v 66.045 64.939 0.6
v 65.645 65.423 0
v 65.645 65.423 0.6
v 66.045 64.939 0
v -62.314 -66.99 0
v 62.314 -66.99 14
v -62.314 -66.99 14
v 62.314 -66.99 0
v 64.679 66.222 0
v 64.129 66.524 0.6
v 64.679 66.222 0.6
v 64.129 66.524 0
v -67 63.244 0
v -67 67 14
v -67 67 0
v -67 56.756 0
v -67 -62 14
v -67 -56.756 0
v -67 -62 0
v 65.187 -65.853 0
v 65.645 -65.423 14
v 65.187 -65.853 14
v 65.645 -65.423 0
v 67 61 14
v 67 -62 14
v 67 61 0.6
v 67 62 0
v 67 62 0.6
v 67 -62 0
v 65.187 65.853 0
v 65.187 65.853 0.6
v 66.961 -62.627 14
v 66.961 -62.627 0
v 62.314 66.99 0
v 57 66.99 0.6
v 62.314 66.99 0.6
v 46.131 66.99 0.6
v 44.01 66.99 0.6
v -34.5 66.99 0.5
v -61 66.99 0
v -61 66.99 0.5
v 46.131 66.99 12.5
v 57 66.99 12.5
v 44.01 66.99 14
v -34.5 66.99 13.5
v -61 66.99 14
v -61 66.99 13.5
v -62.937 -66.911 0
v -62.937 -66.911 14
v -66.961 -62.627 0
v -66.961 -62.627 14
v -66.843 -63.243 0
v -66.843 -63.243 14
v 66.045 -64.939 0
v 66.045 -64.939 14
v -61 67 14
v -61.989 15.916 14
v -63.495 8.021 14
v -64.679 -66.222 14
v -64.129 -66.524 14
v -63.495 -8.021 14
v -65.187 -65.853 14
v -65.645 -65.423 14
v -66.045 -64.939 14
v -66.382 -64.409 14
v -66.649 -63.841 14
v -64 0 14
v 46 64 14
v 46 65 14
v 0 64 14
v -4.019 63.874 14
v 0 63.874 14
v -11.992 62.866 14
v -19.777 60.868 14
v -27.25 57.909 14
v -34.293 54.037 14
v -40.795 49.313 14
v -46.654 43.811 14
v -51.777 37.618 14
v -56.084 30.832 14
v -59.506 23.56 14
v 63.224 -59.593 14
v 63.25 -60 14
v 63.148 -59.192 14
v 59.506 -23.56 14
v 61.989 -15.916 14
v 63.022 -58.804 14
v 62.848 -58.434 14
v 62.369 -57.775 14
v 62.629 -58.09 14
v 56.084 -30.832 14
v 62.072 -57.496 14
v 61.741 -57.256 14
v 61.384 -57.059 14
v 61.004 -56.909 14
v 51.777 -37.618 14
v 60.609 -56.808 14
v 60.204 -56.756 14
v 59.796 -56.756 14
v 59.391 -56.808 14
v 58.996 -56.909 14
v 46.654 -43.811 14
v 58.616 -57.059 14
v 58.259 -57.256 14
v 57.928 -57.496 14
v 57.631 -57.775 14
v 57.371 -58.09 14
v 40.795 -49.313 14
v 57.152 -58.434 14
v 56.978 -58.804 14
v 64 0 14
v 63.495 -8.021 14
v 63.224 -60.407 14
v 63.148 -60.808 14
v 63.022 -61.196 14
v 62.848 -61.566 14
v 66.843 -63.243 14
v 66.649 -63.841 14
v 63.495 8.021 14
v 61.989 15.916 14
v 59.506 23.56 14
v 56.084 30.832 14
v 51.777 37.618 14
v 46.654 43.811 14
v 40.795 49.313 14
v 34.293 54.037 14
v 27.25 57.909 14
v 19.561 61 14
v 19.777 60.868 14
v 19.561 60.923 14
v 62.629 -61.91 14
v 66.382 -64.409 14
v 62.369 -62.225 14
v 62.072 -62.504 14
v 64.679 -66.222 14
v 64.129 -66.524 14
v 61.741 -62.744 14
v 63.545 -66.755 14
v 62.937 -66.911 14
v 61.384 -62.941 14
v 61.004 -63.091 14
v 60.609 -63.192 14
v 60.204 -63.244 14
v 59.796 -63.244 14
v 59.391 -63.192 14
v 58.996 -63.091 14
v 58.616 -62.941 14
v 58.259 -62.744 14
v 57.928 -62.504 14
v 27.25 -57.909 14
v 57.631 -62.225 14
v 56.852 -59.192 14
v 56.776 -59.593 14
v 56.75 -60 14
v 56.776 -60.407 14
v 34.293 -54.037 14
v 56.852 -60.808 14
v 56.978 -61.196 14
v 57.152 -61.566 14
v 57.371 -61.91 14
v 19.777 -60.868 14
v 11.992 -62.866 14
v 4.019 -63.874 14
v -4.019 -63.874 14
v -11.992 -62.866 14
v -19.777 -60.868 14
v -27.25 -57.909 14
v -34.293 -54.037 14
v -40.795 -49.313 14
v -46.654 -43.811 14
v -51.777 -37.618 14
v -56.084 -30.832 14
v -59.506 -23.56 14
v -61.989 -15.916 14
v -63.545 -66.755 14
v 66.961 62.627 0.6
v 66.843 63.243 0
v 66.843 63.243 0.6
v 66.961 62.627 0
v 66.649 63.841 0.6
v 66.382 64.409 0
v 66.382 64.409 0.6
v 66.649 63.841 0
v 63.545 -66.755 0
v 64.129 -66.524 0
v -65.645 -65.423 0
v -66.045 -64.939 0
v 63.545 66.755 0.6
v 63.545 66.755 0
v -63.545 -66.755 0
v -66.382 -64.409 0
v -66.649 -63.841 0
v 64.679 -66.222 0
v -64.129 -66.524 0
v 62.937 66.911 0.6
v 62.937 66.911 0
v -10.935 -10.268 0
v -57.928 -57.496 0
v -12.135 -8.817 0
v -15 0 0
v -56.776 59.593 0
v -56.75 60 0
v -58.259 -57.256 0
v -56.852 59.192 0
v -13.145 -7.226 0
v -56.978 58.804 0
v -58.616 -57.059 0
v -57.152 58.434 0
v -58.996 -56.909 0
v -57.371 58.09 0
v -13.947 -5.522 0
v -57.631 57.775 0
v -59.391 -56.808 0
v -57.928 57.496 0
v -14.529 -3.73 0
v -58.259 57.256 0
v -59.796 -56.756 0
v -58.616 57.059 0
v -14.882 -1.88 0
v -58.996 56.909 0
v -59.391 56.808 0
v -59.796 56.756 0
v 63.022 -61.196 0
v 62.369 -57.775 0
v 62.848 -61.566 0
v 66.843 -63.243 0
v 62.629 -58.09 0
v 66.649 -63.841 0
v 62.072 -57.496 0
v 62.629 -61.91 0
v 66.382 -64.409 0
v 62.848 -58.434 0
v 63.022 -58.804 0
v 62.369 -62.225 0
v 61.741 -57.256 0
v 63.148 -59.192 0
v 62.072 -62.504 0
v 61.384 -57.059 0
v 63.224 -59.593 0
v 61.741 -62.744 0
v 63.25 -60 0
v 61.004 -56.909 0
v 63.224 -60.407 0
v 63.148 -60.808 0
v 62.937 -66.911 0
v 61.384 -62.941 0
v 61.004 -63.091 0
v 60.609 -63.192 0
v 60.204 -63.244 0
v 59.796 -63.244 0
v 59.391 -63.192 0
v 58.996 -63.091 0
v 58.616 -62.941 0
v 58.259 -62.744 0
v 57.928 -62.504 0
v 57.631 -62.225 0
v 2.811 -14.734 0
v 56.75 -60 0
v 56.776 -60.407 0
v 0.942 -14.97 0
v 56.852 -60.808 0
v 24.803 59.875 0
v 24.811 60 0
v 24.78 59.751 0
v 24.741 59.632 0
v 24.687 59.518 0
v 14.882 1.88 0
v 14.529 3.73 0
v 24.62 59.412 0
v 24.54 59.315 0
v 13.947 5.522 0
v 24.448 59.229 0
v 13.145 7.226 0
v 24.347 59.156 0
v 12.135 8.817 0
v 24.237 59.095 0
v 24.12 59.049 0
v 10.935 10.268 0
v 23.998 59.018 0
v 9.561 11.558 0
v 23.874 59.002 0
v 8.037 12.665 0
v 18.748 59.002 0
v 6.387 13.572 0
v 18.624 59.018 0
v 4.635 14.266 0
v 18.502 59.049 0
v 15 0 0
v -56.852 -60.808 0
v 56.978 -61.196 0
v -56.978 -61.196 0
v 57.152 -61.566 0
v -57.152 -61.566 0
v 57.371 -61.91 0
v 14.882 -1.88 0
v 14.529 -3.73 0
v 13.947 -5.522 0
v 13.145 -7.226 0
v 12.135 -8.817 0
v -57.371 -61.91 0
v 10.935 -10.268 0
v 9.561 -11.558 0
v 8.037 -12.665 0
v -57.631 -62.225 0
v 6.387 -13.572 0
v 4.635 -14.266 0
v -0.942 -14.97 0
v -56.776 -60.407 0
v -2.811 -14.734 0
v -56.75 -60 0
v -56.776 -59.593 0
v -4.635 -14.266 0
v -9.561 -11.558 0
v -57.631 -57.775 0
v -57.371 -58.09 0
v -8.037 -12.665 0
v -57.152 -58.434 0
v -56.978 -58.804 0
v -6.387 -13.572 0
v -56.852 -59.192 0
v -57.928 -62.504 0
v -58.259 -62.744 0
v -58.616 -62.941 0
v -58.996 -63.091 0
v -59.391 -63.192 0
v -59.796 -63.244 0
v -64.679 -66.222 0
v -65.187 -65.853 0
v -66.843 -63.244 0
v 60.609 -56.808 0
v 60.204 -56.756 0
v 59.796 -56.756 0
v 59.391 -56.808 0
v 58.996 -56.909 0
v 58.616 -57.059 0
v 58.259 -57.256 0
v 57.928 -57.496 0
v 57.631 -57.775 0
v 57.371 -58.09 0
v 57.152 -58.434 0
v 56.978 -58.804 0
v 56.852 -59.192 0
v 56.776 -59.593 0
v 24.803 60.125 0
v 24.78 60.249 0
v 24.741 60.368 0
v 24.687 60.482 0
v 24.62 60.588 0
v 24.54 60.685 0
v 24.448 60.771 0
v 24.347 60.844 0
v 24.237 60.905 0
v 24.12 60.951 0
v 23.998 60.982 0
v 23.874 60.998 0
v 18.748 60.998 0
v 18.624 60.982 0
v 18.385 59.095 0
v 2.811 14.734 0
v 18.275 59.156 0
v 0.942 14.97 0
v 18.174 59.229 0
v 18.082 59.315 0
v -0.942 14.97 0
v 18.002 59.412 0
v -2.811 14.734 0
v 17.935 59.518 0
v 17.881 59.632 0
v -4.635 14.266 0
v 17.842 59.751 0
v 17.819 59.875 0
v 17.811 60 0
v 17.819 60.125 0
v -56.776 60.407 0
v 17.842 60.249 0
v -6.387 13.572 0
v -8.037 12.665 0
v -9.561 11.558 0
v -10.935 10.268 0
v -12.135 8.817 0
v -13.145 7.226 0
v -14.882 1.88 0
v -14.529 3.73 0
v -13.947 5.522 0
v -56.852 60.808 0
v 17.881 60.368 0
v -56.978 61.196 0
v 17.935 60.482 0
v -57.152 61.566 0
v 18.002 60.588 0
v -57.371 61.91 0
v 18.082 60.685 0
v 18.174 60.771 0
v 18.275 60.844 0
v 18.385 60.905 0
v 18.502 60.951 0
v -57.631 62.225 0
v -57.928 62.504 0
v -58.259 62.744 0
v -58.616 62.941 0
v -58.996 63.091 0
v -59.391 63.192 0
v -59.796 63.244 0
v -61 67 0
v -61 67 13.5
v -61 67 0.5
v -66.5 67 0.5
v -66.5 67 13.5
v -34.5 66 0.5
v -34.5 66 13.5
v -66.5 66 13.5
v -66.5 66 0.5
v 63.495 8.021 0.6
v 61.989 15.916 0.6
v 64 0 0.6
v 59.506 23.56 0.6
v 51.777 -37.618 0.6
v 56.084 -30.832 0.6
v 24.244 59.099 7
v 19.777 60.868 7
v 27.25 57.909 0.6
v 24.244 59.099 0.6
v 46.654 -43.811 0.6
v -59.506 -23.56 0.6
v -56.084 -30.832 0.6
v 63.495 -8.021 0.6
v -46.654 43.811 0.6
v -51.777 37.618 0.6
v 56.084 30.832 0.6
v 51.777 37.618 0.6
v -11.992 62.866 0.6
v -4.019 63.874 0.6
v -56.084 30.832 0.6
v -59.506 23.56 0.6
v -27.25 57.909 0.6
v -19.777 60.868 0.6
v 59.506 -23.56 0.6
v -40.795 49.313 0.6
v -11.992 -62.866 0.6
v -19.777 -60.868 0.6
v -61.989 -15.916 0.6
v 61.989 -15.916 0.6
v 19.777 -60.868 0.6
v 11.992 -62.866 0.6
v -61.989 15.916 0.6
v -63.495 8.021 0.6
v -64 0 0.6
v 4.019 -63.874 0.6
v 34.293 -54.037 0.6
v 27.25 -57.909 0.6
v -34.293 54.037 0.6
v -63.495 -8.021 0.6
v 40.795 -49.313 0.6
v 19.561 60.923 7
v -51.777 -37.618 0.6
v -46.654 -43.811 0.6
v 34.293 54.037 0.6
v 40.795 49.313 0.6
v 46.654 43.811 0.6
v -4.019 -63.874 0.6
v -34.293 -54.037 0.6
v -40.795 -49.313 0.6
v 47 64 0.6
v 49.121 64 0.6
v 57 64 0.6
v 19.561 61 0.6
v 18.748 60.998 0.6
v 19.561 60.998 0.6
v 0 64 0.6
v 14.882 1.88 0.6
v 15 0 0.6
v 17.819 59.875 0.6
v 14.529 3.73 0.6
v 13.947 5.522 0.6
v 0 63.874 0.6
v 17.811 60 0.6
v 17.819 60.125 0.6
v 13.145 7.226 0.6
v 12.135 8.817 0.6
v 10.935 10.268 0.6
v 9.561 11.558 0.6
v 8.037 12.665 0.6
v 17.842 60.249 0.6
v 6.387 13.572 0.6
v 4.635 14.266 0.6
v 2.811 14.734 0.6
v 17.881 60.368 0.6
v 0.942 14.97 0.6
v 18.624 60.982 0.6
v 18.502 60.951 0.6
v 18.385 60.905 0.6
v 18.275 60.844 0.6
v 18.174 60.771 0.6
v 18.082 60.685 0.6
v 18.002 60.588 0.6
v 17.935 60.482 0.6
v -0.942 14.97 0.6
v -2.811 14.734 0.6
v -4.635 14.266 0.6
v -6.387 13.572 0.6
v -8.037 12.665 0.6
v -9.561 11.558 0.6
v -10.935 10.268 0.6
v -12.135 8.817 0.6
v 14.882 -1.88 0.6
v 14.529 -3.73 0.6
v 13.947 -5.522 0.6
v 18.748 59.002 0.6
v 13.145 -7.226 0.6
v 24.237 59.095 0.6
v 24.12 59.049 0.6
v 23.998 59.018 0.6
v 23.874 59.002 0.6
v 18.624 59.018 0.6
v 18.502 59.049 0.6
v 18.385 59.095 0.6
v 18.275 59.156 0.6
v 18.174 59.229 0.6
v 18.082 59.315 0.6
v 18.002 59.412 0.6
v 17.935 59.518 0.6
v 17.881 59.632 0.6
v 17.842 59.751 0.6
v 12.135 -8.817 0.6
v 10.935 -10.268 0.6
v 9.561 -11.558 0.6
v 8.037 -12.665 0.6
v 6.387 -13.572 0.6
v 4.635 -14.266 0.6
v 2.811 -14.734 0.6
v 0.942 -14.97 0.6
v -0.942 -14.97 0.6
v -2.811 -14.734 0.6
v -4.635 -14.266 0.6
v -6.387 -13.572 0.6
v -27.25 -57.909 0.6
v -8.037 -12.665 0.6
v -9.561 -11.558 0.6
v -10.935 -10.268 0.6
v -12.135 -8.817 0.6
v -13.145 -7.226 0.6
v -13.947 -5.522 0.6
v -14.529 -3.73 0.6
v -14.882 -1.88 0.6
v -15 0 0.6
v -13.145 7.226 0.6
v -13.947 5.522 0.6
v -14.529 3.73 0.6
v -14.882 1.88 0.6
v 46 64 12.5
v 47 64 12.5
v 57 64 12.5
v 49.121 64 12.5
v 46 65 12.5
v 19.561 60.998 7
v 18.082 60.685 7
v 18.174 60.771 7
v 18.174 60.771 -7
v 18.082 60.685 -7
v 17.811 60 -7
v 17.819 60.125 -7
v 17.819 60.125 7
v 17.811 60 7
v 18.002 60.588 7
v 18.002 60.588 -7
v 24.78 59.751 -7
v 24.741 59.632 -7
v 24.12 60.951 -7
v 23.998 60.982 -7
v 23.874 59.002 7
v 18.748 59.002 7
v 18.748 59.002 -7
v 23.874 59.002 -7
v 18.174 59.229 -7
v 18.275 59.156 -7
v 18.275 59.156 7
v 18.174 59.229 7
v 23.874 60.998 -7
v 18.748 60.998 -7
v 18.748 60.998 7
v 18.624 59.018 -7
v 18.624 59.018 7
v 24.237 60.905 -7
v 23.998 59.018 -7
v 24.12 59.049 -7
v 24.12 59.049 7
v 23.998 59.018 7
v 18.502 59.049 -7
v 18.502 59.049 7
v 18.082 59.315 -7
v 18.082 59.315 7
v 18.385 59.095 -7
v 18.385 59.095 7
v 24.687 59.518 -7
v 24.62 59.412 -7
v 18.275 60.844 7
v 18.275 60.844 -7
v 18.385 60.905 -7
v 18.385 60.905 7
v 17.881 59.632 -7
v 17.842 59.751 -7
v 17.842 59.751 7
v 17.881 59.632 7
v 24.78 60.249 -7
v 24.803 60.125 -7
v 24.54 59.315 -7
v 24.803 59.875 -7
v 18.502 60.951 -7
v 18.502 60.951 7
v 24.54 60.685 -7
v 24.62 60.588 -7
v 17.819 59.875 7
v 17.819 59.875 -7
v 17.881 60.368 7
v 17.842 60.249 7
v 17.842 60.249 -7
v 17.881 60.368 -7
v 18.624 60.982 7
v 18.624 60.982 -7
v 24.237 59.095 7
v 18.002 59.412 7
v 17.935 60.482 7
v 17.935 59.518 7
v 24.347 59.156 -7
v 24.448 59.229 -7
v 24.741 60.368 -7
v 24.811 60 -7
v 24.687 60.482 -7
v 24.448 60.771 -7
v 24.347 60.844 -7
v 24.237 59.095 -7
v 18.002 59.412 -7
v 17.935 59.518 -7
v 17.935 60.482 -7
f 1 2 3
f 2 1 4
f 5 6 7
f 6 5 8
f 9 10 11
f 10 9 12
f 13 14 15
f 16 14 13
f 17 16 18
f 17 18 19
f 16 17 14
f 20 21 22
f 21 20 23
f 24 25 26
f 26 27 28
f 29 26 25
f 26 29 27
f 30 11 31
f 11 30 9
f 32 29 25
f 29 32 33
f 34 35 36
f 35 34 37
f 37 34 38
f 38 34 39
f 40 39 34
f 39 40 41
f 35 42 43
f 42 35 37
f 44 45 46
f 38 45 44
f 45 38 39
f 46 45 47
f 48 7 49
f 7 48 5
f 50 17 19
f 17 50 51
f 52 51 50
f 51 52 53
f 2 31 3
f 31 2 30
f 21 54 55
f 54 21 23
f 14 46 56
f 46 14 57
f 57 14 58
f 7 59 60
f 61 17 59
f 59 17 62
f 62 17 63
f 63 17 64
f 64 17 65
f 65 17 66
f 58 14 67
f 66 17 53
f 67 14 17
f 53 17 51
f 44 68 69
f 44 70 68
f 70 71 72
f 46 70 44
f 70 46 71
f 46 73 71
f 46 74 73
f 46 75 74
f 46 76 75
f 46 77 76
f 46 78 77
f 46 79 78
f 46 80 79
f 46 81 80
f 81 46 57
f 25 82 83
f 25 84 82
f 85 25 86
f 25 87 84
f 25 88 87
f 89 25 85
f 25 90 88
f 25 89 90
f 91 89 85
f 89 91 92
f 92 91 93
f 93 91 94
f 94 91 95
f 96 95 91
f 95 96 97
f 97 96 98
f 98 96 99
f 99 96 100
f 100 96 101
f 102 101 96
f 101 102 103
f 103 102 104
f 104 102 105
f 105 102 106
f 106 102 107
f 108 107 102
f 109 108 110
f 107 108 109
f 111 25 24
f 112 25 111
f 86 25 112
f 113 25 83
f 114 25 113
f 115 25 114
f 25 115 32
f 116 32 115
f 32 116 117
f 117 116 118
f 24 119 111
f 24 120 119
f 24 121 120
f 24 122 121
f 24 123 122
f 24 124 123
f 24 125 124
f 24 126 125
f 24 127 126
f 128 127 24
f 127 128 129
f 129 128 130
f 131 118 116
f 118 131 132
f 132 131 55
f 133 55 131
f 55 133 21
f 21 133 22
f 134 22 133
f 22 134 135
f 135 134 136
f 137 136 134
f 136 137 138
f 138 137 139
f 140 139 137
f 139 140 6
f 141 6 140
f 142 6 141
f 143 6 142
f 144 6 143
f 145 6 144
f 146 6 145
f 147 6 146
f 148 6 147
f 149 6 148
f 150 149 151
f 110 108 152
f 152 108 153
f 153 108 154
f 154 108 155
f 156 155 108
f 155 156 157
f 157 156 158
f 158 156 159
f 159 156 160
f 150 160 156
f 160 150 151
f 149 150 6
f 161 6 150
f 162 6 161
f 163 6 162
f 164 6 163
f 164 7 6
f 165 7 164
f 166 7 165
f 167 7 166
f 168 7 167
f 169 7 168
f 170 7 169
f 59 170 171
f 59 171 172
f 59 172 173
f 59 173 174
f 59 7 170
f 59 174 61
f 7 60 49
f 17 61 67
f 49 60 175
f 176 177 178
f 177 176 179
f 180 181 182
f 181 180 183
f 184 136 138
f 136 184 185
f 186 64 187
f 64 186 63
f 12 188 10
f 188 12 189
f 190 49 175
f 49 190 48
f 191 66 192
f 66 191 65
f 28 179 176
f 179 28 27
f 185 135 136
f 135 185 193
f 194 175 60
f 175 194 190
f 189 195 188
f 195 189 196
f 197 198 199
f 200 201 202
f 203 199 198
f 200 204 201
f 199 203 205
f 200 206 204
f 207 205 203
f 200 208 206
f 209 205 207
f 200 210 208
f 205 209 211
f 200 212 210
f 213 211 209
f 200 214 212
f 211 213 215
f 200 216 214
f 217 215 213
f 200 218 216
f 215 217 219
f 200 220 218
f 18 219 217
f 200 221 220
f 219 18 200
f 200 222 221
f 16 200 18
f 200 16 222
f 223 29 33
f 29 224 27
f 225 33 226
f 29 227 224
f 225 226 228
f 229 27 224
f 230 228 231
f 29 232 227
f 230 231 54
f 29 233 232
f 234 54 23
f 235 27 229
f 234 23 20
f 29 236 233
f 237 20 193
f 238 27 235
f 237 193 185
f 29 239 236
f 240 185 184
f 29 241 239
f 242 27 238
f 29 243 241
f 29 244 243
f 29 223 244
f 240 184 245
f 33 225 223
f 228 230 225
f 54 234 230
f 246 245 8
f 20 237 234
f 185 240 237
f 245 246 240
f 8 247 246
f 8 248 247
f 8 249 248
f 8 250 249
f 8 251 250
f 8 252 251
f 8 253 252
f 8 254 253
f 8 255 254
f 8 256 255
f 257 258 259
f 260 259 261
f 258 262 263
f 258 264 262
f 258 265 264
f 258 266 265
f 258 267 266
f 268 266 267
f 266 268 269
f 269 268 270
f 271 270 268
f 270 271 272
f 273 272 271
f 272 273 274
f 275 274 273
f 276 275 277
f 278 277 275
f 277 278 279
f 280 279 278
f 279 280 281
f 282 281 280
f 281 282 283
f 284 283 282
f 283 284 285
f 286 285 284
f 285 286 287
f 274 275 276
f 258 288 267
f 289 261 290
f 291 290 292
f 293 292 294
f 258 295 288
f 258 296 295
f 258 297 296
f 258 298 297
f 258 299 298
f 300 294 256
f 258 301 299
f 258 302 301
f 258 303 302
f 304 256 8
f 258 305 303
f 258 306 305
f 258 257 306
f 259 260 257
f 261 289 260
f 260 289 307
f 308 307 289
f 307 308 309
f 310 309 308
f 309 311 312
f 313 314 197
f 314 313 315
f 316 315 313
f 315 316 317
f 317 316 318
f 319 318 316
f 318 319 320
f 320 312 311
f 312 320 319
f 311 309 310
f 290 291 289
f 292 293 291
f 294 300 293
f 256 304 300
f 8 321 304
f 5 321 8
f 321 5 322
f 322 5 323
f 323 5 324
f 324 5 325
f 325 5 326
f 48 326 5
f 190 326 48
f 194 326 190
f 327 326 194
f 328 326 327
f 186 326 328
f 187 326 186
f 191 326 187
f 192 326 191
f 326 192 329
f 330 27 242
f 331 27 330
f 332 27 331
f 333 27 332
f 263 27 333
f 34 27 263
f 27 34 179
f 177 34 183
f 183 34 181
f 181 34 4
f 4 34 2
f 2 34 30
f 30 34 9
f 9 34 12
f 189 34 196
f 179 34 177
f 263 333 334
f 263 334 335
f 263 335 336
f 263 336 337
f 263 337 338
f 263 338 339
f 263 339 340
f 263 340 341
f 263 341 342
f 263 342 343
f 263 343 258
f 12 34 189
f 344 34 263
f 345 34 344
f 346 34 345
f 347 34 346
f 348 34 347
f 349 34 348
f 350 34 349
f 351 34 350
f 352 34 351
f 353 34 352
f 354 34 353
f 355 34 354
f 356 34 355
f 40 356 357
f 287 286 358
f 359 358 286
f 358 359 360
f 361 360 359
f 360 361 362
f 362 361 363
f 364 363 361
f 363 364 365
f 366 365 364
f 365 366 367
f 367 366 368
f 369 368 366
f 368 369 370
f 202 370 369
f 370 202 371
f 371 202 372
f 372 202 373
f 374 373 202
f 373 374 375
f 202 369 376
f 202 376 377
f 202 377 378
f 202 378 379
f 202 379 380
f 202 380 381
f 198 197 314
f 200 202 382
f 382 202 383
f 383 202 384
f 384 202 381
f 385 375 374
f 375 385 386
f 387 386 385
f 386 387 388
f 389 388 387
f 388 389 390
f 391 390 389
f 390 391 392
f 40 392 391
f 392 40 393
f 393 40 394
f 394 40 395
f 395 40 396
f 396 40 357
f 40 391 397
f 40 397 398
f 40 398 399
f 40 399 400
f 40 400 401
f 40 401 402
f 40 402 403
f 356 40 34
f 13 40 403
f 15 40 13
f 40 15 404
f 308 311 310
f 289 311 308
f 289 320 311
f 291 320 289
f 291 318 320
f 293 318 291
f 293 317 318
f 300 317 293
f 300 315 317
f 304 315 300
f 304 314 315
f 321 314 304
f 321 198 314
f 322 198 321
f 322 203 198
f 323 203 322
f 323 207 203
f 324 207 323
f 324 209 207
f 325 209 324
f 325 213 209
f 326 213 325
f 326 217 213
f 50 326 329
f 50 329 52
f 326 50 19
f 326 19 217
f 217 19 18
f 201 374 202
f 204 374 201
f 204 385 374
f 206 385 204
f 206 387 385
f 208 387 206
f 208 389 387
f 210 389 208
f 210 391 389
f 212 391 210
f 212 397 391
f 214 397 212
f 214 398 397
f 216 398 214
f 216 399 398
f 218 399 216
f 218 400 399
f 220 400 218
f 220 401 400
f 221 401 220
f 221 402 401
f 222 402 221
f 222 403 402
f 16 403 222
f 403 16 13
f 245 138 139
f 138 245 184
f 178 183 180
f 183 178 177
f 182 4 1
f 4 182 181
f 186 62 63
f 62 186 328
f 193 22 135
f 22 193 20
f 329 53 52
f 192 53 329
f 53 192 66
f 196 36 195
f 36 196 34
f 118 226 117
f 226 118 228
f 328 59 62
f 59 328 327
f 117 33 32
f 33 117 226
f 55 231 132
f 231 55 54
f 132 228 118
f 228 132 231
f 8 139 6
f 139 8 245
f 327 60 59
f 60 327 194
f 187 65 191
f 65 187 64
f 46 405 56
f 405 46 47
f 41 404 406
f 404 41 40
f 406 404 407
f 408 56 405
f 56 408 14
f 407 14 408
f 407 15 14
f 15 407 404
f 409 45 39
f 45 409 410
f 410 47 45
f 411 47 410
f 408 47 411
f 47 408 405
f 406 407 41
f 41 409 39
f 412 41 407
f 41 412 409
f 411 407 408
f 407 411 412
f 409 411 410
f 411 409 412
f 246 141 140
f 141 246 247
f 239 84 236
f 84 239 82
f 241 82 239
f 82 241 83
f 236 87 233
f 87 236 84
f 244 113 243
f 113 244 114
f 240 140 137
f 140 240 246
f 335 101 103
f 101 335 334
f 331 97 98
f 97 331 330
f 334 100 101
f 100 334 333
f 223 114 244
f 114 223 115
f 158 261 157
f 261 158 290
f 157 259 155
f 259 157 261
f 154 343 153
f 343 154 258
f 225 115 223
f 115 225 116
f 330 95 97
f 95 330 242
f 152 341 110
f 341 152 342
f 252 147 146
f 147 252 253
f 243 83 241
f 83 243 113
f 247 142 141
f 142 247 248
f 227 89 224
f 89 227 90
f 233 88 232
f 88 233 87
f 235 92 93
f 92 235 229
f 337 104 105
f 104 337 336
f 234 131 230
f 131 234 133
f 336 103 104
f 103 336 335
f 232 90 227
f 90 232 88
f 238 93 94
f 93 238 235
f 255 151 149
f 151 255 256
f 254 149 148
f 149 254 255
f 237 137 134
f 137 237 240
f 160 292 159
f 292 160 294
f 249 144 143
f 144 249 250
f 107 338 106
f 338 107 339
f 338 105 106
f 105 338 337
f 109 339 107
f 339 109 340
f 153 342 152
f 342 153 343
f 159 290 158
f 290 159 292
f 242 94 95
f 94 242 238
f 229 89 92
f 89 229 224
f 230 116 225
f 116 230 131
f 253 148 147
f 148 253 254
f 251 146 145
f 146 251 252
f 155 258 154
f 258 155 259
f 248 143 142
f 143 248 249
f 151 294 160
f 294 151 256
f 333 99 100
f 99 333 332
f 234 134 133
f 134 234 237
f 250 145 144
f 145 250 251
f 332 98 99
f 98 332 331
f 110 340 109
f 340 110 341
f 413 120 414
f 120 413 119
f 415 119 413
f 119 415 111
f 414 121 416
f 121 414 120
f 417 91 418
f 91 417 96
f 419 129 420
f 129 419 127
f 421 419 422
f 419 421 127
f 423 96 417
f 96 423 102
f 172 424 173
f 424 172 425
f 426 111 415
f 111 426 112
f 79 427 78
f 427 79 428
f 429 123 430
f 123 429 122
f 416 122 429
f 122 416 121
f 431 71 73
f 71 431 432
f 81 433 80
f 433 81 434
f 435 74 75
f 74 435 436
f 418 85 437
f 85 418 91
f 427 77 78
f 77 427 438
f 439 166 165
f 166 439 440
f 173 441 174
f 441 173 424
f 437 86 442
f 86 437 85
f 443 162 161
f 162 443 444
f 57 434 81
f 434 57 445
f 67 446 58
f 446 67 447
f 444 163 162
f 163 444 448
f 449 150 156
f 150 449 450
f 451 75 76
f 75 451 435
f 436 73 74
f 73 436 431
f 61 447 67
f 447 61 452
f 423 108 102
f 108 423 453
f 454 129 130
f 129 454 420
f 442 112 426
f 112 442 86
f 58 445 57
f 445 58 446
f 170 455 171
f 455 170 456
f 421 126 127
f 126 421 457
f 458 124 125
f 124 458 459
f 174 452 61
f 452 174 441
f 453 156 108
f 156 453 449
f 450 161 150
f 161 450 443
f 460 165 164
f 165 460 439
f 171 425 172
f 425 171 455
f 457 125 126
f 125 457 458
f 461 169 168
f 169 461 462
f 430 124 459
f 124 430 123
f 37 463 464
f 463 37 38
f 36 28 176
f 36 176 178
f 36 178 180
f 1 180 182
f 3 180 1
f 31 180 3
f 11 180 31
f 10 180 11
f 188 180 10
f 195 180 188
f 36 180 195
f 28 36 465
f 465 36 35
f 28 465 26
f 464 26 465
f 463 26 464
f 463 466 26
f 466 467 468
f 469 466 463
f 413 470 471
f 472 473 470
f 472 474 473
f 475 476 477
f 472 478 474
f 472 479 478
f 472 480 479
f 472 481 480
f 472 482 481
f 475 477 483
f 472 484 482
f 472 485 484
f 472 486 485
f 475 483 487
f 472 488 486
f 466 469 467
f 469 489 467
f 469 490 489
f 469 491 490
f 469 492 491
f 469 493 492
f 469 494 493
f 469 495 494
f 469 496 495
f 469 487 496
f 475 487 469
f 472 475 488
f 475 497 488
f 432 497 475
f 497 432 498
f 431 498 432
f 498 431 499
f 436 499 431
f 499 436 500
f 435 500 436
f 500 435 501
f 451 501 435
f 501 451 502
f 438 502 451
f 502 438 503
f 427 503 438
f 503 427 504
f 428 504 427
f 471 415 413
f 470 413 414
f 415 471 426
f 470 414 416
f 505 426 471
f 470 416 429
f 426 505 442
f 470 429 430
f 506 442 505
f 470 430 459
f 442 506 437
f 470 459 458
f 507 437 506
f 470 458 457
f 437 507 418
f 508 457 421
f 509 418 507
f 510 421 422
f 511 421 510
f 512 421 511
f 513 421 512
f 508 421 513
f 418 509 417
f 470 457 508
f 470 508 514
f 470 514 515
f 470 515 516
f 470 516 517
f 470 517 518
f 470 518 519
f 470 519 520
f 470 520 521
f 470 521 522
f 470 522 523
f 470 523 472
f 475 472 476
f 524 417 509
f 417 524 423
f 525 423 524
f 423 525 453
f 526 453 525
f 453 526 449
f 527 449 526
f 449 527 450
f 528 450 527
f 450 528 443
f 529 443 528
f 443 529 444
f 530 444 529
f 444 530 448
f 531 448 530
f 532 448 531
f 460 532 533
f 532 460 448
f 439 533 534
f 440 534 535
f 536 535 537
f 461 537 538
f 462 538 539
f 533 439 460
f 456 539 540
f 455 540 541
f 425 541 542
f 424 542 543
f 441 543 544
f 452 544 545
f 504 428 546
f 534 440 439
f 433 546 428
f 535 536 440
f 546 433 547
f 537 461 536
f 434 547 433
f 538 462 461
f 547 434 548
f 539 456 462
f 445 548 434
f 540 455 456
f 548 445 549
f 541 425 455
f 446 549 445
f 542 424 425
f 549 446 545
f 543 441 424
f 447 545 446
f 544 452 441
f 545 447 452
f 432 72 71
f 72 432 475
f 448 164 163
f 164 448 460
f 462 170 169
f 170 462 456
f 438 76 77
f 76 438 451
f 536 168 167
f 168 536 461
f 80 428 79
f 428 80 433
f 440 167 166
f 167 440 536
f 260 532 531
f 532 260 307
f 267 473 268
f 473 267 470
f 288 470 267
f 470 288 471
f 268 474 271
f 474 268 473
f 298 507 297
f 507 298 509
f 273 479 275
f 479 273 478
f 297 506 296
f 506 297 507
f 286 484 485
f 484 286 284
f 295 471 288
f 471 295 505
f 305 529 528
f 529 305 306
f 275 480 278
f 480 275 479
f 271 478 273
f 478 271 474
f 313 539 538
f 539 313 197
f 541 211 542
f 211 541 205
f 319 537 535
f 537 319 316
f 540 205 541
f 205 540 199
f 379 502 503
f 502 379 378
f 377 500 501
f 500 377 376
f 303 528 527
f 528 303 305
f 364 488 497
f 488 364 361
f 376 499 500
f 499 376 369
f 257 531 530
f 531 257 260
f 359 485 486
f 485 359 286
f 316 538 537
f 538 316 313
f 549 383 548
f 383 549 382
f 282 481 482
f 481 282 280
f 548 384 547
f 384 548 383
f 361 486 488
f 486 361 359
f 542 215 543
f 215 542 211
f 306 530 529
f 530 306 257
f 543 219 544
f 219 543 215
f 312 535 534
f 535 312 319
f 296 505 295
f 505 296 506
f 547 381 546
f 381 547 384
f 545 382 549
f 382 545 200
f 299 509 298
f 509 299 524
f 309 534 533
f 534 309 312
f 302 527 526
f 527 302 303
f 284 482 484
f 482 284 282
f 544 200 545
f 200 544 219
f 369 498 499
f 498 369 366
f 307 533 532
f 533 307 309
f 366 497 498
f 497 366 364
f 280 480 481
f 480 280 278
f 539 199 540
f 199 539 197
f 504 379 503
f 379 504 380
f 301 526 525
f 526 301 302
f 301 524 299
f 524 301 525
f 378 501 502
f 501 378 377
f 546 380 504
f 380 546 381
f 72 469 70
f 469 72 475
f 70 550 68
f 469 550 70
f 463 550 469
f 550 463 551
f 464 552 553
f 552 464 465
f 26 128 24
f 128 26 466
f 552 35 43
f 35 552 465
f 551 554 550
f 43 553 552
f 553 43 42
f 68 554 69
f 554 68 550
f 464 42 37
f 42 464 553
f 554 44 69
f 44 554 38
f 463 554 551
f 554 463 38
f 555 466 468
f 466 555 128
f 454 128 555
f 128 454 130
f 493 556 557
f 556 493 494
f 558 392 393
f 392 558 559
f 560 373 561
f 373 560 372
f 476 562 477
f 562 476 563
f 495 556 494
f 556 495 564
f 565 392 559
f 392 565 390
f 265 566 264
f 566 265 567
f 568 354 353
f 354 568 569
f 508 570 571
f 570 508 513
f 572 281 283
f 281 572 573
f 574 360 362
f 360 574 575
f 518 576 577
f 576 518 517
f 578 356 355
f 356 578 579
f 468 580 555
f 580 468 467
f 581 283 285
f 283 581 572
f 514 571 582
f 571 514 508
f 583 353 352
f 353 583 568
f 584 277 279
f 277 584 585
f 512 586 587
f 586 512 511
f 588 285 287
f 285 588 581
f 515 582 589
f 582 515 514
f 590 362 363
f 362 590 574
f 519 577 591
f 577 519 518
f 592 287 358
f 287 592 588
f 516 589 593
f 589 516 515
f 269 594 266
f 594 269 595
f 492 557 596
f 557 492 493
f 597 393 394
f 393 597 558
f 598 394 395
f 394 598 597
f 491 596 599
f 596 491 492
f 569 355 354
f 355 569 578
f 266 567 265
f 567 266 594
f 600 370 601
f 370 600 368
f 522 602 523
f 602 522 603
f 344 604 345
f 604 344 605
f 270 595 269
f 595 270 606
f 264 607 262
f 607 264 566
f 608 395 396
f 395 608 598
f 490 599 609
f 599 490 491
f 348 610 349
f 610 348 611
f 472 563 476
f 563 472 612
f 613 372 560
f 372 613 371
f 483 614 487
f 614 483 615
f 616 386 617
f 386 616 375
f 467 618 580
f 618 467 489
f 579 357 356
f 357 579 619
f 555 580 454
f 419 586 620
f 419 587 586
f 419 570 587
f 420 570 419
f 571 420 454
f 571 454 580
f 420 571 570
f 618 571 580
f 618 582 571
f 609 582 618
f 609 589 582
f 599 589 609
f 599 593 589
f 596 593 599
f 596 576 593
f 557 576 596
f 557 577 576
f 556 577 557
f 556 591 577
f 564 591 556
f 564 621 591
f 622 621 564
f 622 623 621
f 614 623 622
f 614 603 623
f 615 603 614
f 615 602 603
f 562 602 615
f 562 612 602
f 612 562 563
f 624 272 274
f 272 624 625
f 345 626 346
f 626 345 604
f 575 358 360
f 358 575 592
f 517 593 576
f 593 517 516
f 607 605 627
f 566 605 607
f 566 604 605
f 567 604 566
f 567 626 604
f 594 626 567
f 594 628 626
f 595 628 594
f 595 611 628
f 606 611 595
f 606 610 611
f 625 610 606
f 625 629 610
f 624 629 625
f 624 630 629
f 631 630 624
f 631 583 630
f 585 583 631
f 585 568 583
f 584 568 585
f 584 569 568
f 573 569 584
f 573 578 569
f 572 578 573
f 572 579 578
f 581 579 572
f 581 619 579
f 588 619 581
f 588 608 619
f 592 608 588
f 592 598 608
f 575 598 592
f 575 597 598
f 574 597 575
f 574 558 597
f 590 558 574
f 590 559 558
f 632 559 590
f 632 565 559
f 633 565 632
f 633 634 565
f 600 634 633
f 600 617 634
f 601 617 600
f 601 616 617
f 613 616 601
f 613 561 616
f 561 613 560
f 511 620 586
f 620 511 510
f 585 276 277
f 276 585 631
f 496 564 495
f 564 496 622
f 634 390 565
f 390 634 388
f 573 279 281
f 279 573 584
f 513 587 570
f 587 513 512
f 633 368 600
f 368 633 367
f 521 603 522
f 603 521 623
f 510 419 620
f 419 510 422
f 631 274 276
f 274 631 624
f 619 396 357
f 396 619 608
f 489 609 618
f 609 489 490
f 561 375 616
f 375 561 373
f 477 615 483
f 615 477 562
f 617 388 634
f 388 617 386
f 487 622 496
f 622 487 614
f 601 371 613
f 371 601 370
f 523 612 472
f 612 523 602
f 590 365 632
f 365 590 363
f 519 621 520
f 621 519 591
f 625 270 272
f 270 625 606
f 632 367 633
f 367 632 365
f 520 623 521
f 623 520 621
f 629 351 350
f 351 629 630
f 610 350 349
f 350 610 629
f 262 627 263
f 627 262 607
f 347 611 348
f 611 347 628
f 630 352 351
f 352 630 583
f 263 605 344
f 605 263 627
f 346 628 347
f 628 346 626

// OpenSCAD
$fn = 50;


union() {
	difference() {
		union() {
			hull() {
				translate(v = [-62.0000000000, 62.0000000000, 0]) {
					cylinder(h = 14, r = 5);
				}
				translate(v = [62.0000000000, 62.0000000000, 0]) {
					cylinder(h = 14, r = 5);
				}
				translate(v = [-62.0000000000, -62.0000000000, 0]) {
					cylinder(h = 14, r = 5);
				}
				translate(v = [62.0000000000, -62.0000000000, 0]) {
					cylinder(h = 14, r = 5);
				}
			}
			translate(v = [-67.0000000000, 61.0000000000, 0]) {
				cube(size = [6, 6, 14]);
			}
		}
		union() {
			translate(v = [-67.5000000000, -60.0000000000, -250.0000000000]) {
				rotate(a = [0, 0, 0]) {
					difference() {
						union() {
							hull() {
								translate(v = [7.5000000000, 0, 0]) {
									cylinder(h = 250, r = 3.2500000000, r1 = 3.2500000000, r2 = 3.2500000000);
								}
								translate(v = [-7.5000000000, 0, 0]) {
									cylinder(h = 250, r = 3.2500000000, r1 = 3.2500000000, r2 = 3.2500000000);
								}
							}
						}
						union();
					}
				}
			}
			translate(v = [-67.5000000000, 60.0000000000, -250.0000000000]) {
				rotate(a = [0, 0, 0]) {
					difference() {
						union() {
							hull() {
								translate(v = [7.5000000000, 0, 0]) {
									cylinder(h = 250, r = 3.2500000000, r1 = 3.2500000000, r2 = 3.2500000000);
								}
								translate(v = [-7.5000000000, 0, 0]) {
									cylinder(h = 250, r = 3.2500000000, r1 = 3.2500000000, r2 = 3.2500000000);
								}
							}
						}
						union();
					}
				}
			}
			translate(v = [-66.5000000000, 66.0000000000, 0.5000000000]) {
				cube(size = [32, 1, 13.0000000000]);
			}
			translate(v = [60.0000000000, -60.0000000000, 0]) {
				cylinder(h = 100, r = 3.2500000000);
			}
			translate(v = [0, 0, 0.6000000000]) {
				cylinder(h = 16.4000000000, r = 64.0000000000);
			}
			translate(v = [0, 0, -7.0000000000]) {
				cylinder(h = 14, r = 15.0000000000);
			}
			translate(v = [0.0000000000, 61.0000000000, 0.6000000000]) {
				cube(size = [67.0000000000, 3, 16.4000000000]);
			}
			translate(v = [57.0000000000, 61.0000000000, 0.6000000000]) {
				cube(size = [10, 6, 16.4000000000]);
			}
			translate(v = [46.0000000000, 61.0000000000, 12.5000000000]) {
				cube(size = [21, 6, 1.5000000000]);
			}
			translate(v = [43.2500000000, 67.7500000000, 0.6000000000]) {
				rotate(a = [0, 0, -45]) {
					cube(size = [7.5000000000, 1.5000000000, 16.4000000000]);
				}
			}
			translate(v = [12.0610000000, 59.0000000000, 0.6000000000]) {
				cube(size = [7.5000000000, 2, 13.4000000000]);
			}
		}
	}
	union() {
		translate(v = [21.3110000000, 60.0000000000, -7.0000000000]) {
			rotate(a = [0, 0, 0]) {
				difference() {
					union() {
						#hull() {
							#translate(v = [2.5000000000, 0, 0]) {
								cylinder(h = 14, r = 1.0000000000, r1 = 1.0000000000, r2 = 1.0000000000);
							}
							#translate(v = [-2.5000000000, 0, 0]) {
								cylinder(h = 14, r = 1.0000000000, r1 = 1.0000000000, r2 = 1.0000000000);
							}
						}
					}
					union();
				}
			}
		}
	}
}
